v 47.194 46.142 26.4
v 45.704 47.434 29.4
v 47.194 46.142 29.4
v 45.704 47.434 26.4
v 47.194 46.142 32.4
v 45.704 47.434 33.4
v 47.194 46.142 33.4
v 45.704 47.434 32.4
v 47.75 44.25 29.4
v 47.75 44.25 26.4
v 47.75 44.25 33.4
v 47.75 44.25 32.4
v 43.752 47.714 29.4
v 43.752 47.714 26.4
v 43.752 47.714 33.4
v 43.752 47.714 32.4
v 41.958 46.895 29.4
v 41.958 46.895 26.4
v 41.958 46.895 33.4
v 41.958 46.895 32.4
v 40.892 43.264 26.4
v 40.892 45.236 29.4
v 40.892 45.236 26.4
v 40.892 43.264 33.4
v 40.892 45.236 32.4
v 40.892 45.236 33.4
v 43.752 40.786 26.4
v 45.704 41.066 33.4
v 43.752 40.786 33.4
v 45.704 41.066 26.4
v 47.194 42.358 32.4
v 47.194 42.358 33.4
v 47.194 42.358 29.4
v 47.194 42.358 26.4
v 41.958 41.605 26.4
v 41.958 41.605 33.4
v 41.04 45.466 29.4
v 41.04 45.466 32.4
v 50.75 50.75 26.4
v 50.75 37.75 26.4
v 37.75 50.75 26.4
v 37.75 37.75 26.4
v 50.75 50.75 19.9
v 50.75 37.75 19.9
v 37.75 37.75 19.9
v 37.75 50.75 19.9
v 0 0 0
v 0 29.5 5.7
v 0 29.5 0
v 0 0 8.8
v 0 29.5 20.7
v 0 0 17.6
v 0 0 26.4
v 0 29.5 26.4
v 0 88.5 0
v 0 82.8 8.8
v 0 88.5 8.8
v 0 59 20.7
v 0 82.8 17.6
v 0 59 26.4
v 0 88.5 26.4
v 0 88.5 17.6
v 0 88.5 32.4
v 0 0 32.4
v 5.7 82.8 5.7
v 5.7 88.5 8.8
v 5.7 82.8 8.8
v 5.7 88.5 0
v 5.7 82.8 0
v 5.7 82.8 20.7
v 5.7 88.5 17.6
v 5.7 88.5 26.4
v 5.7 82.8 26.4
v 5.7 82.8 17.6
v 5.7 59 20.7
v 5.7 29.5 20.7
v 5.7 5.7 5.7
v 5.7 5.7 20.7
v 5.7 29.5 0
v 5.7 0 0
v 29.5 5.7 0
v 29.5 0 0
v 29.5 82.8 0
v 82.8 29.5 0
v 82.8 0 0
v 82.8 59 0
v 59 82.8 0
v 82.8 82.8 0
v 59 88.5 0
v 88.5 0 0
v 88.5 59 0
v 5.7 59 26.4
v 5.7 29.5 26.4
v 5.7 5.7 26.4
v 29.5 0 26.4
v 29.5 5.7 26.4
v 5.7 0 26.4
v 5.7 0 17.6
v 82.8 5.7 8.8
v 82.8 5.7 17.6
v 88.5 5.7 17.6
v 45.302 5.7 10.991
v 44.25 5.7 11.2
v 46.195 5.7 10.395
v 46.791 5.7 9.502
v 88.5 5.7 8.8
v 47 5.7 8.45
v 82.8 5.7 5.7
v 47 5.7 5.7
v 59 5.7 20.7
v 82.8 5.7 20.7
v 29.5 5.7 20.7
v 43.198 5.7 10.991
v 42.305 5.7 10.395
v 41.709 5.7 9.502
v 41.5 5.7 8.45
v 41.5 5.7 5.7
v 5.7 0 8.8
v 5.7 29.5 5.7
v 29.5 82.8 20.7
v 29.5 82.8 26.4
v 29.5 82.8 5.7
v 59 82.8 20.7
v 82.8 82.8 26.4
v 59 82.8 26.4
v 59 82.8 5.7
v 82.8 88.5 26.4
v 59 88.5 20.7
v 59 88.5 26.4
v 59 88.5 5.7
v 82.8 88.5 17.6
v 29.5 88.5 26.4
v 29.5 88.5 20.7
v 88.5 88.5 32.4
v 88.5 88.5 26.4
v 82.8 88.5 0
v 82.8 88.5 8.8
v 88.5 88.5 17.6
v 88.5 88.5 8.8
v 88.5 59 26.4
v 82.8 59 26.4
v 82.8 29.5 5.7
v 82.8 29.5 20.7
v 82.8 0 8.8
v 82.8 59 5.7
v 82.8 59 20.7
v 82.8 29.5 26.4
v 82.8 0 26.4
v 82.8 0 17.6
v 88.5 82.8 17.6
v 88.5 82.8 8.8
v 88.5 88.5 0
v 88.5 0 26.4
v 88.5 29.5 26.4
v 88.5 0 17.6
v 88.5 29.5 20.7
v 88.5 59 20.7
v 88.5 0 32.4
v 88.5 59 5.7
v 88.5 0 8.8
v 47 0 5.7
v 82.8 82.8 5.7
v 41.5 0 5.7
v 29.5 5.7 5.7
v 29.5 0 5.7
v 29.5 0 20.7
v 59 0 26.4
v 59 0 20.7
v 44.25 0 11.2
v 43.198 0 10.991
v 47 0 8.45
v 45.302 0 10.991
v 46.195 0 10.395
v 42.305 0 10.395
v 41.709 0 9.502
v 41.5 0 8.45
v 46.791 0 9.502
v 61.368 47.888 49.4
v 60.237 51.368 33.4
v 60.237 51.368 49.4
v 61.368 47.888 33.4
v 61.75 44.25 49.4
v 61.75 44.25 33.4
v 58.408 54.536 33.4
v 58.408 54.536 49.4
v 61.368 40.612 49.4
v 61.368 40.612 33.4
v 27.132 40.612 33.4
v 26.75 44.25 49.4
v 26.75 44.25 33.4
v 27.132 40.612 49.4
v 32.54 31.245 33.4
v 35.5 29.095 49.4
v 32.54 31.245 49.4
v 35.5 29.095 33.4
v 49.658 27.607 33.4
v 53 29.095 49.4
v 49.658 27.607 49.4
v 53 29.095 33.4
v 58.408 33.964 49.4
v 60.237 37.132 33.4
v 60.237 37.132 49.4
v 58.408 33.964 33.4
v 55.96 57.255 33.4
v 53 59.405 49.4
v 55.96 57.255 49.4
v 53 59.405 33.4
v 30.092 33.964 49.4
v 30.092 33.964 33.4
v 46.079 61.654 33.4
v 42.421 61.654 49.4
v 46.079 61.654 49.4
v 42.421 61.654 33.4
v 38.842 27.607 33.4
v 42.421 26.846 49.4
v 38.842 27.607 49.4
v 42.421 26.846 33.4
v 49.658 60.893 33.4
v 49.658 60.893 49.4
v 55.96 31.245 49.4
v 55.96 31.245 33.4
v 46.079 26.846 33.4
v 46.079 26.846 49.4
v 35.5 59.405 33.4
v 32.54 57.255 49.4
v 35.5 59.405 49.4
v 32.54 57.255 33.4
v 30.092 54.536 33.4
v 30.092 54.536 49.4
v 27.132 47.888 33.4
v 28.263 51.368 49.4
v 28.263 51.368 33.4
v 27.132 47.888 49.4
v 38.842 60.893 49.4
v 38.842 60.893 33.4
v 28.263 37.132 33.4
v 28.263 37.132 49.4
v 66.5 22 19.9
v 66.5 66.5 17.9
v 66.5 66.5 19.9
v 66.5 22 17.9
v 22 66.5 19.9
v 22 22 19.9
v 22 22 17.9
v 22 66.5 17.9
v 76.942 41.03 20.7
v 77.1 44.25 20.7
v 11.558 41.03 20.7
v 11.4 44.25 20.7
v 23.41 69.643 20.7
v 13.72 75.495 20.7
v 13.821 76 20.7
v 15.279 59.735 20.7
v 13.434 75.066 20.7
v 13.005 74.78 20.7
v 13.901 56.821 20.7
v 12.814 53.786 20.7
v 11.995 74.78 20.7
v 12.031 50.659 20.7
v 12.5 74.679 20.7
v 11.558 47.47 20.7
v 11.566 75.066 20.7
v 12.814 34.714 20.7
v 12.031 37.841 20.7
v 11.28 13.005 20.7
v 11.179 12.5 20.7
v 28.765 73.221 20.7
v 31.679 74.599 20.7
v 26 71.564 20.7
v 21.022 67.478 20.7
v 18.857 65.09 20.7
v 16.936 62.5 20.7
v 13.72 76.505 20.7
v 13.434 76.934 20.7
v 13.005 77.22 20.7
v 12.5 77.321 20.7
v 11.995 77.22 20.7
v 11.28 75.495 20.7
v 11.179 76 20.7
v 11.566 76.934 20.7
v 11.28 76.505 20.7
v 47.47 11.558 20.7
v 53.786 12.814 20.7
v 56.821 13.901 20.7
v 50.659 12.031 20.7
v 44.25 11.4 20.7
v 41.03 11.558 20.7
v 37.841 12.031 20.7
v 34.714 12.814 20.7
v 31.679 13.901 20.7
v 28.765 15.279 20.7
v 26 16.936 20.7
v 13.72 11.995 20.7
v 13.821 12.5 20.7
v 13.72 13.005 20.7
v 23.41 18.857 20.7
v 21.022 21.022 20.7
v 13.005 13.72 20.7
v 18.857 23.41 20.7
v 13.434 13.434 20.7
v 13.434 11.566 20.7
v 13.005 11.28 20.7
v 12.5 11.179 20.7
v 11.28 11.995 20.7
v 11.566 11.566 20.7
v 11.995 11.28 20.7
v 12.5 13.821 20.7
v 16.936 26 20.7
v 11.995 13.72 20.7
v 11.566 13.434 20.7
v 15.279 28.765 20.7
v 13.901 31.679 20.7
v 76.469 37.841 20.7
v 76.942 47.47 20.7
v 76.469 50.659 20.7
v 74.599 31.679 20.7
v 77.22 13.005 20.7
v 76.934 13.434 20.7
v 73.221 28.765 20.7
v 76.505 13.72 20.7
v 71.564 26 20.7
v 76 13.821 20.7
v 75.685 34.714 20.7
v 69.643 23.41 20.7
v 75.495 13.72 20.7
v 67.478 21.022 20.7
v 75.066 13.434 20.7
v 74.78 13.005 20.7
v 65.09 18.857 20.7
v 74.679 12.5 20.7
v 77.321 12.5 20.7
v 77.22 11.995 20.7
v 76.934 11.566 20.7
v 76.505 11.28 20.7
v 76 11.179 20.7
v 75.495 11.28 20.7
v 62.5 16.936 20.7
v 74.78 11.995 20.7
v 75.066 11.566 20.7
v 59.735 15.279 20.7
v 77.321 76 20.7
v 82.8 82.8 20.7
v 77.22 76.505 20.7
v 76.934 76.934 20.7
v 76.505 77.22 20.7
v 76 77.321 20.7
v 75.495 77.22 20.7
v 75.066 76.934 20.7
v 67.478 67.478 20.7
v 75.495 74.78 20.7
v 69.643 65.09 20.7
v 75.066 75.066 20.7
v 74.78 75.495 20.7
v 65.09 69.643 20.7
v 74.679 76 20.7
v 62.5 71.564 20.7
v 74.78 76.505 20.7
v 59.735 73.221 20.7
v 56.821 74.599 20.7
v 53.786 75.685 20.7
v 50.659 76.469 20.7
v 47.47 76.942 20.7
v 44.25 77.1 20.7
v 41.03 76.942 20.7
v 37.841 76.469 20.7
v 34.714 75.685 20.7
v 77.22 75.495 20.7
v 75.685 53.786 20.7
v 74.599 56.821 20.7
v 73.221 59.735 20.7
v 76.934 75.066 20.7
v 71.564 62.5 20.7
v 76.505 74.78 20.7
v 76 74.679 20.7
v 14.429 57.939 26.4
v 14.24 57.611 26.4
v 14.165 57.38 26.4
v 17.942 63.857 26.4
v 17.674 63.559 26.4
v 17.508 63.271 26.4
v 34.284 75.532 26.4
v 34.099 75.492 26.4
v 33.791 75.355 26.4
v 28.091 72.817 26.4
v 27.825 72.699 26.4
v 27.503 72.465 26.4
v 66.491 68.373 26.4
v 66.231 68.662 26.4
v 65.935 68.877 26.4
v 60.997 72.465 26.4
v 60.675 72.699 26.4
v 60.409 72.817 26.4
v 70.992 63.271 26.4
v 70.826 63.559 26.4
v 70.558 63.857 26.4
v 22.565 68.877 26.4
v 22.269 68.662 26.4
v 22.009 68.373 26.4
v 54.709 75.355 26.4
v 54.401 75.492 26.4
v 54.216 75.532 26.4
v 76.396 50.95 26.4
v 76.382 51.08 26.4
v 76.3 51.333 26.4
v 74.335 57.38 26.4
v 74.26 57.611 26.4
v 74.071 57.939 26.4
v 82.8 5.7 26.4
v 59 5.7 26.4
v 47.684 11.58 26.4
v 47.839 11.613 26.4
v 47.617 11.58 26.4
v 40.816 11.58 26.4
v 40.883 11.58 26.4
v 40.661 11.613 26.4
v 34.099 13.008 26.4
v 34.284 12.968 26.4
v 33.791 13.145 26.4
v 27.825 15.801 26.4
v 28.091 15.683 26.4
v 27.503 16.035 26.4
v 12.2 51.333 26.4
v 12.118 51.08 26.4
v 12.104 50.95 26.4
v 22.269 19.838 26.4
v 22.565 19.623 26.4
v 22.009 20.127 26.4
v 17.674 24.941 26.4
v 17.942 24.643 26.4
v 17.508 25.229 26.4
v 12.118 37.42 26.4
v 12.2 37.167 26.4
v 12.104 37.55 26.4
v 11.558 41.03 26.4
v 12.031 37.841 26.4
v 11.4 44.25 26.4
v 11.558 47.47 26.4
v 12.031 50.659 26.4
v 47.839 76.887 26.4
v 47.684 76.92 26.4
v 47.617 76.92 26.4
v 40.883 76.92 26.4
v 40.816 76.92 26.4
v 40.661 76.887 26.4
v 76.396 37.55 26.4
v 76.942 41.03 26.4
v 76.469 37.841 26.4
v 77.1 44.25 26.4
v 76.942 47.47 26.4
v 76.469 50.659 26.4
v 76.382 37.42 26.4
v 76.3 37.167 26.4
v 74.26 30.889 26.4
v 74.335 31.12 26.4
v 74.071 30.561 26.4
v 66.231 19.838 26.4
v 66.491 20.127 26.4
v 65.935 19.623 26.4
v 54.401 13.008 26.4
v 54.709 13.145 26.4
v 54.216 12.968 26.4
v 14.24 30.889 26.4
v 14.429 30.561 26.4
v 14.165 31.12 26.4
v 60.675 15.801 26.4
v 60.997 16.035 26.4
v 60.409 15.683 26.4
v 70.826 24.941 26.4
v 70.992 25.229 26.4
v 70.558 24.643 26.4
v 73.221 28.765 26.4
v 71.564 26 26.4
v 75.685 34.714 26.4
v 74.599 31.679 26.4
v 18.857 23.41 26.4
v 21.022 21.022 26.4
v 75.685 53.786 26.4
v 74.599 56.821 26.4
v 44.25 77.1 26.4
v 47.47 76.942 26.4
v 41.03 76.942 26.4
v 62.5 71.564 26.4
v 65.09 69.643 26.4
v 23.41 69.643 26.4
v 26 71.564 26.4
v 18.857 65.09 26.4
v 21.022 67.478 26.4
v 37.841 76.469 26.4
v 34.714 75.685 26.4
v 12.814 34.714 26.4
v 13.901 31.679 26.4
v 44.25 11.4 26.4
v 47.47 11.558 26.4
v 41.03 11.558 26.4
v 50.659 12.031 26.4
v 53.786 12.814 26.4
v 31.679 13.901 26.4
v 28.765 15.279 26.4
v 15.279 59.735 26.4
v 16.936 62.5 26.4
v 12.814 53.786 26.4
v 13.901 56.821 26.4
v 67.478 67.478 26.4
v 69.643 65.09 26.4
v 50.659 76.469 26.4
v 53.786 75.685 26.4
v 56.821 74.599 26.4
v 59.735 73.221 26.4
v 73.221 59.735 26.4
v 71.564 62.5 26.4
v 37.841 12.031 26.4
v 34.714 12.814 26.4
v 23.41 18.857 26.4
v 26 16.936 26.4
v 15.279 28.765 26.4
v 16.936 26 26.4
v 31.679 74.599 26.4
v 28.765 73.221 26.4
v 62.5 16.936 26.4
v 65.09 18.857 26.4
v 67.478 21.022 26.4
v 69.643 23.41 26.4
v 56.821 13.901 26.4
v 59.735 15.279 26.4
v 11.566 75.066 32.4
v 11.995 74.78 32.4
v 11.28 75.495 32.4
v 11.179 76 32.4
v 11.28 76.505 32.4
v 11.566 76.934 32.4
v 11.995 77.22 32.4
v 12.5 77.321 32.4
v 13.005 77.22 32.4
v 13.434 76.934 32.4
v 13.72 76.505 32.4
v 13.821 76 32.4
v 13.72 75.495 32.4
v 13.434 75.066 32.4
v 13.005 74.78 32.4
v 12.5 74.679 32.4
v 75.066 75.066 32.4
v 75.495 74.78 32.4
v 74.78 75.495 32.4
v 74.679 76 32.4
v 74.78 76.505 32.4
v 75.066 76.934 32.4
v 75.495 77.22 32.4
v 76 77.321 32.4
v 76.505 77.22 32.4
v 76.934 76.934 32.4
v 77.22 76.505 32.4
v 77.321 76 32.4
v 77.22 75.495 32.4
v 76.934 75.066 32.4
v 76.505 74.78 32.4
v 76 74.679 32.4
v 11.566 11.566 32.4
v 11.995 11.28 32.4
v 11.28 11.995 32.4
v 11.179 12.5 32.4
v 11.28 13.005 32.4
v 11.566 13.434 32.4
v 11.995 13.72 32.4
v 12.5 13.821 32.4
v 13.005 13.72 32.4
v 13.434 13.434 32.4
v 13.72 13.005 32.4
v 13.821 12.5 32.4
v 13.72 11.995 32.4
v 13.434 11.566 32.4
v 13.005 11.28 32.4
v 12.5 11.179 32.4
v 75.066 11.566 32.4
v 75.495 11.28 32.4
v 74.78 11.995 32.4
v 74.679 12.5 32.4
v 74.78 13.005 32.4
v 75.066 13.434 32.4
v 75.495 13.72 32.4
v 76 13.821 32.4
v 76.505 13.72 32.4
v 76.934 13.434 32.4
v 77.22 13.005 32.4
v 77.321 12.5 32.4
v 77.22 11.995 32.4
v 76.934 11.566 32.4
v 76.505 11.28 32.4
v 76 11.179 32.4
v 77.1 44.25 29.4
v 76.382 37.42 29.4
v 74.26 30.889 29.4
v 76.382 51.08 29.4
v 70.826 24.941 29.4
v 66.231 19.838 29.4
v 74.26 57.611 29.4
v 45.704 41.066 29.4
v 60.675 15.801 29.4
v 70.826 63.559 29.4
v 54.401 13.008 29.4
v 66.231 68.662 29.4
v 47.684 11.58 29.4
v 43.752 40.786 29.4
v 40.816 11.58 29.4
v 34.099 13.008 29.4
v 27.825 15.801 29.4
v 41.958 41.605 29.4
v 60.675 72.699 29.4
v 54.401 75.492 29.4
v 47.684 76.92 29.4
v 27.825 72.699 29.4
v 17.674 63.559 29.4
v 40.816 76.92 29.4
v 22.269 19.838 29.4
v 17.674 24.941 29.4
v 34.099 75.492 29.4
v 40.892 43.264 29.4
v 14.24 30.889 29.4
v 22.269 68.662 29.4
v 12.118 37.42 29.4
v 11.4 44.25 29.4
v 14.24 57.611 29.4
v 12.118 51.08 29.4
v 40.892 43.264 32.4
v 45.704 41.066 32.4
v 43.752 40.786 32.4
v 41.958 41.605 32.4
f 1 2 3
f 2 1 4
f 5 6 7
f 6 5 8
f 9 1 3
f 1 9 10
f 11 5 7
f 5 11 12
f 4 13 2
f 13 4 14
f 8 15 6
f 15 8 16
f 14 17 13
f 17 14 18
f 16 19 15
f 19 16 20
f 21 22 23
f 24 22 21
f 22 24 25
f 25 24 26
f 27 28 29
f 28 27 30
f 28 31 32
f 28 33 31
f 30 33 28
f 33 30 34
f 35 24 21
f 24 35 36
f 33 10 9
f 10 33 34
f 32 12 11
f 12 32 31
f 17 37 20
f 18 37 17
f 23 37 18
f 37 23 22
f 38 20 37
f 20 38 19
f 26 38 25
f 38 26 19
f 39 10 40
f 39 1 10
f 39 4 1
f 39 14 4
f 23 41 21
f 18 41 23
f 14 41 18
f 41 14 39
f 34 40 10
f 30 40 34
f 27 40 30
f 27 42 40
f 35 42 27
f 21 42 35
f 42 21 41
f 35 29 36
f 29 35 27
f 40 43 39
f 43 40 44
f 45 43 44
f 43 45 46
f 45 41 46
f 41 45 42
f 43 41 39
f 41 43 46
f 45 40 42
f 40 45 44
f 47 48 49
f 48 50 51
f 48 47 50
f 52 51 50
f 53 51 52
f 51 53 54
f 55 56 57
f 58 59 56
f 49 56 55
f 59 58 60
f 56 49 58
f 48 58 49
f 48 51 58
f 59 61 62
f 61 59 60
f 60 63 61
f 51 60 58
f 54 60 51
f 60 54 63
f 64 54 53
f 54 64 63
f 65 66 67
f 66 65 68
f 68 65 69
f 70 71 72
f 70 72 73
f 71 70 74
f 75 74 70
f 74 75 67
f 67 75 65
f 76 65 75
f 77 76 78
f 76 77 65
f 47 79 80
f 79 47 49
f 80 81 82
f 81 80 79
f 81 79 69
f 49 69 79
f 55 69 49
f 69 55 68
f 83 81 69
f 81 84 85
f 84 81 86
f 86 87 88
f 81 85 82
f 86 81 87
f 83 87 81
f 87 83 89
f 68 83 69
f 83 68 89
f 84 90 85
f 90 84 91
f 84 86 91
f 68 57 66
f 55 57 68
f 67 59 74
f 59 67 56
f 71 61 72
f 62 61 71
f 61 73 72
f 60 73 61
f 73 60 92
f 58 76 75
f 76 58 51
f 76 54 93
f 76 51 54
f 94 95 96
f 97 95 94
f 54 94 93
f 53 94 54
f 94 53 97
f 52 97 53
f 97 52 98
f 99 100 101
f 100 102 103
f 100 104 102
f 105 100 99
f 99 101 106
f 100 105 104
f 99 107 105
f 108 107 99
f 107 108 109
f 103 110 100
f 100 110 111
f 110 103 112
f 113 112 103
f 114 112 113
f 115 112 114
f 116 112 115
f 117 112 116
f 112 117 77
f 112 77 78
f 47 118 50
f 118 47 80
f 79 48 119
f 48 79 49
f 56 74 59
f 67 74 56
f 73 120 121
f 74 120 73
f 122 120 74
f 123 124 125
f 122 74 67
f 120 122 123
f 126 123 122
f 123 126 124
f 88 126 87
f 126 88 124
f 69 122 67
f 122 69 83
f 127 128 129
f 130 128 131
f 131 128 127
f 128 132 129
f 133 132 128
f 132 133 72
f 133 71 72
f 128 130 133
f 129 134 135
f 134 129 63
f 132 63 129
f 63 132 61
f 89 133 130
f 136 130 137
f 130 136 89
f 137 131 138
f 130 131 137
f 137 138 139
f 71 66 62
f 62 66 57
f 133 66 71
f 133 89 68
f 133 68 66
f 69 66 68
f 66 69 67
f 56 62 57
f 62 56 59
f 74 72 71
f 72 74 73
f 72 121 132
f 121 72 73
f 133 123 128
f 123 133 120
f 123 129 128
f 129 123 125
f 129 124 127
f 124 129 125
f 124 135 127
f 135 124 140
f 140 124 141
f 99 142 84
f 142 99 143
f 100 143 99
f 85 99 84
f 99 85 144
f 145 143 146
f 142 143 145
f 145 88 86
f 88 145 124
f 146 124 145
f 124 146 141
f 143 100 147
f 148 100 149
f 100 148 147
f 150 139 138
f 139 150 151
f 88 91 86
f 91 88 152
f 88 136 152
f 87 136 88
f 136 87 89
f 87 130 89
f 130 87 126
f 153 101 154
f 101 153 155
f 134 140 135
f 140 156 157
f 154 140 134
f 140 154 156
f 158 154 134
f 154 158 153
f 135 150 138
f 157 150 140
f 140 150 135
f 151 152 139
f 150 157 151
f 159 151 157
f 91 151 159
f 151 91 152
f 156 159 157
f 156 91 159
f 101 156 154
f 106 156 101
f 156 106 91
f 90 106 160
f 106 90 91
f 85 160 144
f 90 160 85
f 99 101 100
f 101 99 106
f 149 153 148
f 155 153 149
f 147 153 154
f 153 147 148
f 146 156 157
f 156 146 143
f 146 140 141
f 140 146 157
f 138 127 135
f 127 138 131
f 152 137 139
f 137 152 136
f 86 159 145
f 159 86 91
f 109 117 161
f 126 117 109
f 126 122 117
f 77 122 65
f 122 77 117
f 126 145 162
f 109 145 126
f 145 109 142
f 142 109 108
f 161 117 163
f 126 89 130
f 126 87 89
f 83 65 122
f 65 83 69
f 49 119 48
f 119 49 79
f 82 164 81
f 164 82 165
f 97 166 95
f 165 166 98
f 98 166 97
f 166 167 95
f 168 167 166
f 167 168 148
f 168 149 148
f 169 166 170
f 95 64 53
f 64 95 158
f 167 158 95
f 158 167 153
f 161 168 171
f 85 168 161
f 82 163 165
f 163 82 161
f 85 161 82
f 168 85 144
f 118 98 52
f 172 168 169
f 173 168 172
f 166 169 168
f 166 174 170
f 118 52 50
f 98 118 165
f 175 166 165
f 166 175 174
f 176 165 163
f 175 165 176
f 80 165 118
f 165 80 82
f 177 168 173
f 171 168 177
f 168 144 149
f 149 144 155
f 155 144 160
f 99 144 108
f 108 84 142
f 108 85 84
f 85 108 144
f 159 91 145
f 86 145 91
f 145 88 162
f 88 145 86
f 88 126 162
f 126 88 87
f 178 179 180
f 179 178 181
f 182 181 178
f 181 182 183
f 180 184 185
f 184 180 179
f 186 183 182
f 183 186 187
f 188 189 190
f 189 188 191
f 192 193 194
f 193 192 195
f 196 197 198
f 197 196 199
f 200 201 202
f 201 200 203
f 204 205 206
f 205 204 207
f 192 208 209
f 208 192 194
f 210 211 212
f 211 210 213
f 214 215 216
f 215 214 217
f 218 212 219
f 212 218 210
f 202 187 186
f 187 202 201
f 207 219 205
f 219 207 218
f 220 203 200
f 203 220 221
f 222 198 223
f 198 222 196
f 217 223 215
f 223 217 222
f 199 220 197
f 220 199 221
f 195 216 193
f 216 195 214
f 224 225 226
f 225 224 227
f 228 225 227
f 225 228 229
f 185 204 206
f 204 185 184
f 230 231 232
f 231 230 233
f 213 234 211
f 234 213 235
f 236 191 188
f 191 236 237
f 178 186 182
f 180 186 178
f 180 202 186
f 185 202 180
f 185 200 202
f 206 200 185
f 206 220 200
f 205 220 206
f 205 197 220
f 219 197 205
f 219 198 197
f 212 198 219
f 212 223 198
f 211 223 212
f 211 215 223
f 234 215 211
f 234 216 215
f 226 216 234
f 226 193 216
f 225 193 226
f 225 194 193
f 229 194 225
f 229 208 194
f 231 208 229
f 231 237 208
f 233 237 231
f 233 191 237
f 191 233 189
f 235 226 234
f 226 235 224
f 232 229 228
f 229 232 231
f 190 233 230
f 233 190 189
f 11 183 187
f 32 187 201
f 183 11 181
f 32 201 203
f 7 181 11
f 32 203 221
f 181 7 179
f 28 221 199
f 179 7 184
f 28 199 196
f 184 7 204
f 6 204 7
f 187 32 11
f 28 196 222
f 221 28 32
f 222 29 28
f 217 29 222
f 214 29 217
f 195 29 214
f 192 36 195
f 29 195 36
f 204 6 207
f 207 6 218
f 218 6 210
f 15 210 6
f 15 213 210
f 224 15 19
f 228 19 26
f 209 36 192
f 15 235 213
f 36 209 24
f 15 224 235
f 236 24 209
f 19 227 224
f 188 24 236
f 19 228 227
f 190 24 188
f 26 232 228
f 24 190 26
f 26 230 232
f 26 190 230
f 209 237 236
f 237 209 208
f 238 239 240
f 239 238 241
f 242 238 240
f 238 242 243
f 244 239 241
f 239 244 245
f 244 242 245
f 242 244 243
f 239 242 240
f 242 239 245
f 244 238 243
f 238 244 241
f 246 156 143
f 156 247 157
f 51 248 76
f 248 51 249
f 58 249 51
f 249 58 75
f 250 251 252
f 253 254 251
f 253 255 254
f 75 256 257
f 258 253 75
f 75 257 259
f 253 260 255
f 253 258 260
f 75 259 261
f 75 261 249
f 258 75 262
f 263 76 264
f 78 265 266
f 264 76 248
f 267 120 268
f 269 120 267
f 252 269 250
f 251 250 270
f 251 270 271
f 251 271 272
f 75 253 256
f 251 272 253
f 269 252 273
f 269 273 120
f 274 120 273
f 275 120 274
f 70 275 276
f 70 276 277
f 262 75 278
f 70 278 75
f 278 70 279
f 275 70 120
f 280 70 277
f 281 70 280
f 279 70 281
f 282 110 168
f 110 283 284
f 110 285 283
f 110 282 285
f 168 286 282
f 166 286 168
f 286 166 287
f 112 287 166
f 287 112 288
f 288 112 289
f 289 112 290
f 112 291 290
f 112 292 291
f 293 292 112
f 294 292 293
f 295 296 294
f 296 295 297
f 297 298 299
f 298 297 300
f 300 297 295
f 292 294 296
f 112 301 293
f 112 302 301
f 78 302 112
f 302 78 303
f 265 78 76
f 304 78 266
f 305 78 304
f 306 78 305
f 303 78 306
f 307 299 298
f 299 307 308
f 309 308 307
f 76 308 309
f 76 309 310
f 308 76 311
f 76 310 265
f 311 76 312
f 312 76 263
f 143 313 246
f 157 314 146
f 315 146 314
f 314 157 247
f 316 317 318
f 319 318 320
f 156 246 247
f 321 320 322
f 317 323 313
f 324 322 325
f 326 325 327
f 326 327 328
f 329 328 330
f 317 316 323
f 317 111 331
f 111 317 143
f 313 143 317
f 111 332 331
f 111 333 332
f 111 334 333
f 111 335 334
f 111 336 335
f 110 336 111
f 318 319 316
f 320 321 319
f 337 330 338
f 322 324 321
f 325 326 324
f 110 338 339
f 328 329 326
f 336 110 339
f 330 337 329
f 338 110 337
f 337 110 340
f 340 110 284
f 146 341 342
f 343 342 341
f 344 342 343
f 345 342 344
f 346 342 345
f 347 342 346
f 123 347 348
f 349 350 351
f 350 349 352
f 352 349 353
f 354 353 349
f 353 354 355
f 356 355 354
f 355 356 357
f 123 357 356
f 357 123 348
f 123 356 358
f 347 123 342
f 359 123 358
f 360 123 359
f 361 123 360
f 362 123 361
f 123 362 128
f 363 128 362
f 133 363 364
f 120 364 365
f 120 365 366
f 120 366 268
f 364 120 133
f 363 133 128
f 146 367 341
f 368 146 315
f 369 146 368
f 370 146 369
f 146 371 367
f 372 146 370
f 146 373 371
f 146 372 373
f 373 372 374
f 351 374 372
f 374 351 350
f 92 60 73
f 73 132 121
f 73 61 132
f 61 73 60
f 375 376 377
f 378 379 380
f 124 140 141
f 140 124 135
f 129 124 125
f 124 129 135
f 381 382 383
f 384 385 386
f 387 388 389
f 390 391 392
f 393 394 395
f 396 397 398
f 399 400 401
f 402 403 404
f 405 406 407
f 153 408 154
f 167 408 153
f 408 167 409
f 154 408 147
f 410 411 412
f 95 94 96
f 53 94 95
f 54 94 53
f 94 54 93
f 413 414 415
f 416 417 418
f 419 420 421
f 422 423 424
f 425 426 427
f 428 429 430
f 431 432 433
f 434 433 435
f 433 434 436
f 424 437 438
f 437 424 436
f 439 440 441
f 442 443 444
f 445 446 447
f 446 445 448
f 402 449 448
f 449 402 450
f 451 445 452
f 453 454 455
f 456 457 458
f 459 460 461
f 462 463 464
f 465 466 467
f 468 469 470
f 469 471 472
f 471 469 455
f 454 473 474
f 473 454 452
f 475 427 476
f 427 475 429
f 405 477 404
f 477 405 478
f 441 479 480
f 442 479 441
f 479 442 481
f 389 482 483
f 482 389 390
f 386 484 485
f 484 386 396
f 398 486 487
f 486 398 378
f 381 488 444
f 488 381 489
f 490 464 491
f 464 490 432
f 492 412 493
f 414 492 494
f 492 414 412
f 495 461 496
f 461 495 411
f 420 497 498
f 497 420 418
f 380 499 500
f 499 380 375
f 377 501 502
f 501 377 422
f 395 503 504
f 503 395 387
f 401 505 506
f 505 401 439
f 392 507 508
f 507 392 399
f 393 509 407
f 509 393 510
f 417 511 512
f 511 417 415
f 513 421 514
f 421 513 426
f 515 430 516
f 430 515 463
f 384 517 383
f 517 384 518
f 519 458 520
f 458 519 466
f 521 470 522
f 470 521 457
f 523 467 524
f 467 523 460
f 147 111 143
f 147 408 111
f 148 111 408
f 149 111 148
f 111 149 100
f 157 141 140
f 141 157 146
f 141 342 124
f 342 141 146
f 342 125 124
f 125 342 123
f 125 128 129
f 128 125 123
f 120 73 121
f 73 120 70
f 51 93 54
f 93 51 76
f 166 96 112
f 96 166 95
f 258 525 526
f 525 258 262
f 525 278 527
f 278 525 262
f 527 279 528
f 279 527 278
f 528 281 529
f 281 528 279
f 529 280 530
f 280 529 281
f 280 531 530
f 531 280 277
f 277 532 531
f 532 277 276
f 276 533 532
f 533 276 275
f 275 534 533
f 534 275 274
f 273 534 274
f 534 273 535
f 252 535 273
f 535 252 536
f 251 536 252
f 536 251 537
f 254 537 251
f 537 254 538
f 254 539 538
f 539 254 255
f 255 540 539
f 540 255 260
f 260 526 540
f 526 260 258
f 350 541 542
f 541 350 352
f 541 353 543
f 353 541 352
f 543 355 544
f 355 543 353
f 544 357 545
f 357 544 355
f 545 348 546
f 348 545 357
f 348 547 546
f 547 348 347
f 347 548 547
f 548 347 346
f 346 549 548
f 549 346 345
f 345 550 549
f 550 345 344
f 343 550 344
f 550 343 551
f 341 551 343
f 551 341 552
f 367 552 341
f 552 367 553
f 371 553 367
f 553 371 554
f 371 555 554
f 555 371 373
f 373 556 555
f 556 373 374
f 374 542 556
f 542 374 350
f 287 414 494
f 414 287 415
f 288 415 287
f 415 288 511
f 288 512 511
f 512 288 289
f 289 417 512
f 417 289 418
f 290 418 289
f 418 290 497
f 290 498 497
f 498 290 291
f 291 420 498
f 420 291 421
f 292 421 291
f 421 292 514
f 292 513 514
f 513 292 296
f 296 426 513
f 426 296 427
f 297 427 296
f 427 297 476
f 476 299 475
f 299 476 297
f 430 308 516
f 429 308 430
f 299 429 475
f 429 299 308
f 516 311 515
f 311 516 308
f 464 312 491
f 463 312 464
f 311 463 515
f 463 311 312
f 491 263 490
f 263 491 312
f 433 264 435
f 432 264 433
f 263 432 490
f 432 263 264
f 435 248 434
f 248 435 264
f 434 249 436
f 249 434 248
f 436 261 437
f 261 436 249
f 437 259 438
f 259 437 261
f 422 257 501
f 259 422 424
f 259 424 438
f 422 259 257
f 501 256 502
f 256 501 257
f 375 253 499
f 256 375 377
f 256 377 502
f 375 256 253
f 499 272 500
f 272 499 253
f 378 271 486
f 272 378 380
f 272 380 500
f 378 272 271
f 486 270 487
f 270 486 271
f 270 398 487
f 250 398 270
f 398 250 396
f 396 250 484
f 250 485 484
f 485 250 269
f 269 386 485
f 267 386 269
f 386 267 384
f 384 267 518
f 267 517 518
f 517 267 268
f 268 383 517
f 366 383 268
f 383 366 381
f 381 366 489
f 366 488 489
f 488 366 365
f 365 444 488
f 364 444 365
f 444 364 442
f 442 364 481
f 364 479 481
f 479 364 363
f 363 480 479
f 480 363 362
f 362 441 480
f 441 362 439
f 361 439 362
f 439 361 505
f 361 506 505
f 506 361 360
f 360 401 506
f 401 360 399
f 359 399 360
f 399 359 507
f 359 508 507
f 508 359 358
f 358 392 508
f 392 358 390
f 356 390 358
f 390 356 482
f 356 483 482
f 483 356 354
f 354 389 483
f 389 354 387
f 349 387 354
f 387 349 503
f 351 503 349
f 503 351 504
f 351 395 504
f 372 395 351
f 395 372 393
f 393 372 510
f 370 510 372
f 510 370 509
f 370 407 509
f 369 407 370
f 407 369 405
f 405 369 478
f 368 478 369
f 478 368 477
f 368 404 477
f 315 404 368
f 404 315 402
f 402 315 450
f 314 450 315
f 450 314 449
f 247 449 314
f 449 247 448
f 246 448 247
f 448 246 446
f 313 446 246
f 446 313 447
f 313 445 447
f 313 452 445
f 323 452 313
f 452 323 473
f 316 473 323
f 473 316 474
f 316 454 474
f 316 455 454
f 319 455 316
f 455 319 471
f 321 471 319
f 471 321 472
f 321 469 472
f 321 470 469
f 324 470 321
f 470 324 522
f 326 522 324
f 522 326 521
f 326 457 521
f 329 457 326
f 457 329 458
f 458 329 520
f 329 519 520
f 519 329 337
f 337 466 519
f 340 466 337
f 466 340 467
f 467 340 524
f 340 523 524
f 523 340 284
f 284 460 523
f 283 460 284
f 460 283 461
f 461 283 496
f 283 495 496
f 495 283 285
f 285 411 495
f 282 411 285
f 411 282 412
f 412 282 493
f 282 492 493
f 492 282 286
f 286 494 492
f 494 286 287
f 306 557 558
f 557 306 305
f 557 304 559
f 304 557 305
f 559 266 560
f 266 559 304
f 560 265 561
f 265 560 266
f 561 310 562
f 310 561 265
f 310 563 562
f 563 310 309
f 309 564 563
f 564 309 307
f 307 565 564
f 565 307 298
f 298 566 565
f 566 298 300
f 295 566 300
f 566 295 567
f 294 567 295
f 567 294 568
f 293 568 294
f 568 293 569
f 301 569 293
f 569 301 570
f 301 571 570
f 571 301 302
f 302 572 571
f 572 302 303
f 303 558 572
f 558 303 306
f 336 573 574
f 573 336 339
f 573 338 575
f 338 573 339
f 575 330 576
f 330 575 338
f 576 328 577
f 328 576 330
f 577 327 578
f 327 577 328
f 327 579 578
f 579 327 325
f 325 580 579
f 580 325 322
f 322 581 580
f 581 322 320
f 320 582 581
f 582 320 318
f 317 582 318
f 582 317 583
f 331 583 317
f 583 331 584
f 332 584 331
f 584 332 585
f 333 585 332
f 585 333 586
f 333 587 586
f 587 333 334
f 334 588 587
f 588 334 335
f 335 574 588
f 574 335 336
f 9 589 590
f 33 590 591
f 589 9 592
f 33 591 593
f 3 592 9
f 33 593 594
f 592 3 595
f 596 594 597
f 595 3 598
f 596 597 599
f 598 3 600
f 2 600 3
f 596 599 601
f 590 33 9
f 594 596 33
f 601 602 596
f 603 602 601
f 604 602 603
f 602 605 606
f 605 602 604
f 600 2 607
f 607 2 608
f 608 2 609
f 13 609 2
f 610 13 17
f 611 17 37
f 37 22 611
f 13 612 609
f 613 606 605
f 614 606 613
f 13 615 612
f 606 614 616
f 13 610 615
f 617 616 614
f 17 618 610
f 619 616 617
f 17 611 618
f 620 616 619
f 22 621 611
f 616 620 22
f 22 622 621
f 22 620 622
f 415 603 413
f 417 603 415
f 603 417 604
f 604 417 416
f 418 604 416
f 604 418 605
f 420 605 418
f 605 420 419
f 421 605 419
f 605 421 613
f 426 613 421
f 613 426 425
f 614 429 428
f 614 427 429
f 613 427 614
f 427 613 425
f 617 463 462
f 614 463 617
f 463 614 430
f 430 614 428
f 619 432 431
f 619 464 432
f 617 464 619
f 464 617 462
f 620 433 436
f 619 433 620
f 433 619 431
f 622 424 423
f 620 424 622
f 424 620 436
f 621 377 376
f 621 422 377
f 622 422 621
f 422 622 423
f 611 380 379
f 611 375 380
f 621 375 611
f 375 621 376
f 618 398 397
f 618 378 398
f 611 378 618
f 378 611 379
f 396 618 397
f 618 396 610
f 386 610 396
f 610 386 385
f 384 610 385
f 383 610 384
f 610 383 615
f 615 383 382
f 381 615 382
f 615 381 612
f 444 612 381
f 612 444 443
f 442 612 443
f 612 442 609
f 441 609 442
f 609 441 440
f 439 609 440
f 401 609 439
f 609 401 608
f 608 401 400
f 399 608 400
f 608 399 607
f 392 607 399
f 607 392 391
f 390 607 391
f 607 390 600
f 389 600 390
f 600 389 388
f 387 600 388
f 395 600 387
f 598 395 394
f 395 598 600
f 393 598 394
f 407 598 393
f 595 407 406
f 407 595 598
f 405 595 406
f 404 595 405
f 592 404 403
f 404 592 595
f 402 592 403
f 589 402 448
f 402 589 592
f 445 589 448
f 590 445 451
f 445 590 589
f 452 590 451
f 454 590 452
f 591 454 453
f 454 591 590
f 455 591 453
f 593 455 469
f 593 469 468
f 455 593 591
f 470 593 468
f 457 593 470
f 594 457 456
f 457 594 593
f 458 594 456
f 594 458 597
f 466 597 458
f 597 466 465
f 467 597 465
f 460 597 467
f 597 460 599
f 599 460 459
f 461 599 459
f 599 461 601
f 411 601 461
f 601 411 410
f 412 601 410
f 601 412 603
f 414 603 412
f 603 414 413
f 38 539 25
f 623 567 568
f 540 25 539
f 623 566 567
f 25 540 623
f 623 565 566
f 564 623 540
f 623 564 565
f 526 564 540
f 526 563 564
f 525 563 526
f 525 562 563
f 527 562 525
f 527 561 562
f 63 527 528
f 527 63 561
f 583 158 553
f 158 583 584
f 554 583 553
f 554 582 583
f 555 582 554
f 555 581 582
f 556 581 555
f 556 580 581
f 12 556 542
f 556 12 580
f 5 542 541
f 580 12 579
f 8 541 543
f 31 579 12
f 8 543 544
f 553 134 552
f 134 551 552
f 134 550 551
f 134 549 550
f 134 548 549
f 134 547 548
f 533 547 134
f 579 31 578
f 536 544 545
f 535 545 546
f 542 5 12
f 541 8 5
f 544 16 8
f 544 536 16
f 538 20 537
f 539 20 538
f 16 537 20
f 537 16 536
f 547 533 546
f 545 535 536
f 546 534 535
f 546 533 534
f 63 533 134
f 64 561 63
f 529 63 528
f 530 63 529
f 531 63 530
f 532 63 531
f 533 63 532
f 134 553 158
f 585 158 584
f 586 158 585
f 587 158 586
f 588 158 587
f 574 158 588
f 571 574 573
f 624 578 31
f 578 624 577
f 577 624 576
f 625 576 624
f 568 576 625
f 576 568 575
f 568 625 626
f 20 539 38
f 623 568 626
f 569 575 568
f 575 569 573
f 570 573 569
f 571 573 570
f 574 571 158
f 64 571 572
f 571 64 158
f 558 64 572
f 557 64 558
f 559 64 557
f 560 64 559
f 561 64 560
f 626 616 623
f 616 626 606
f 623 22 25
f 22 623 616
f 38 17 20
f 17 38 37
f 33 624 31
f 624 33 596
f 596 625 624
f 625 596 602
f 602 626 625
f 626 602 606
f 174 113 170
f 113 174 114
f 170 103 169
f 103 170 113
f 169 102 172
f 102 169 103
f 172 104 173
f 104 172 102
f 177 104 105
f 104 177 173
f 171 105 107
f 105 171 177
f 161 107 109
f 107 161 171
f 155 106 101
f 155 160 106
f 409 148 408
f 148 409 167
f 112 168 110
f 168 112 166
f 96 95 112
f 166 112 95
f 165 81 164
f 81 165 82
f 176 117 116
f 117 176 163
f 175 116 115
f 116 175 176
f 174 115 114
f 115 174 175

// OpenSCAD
kerf = 0.1;

TW = 5.7; // wood
//TW = 3.5; // thinner wood
TA = 3.0; // acrylic

// 3h + w = 181
// 3w = 181

tn = 3;
tnb = 3;
tnt = 3;

s440 = 2.845/2;

inset = TW; // inset of acrylic in wood

middle = 100;

box_s = 5*TW*4;
P = 2; 
box_s = 59*3/2; // floor((181-2*2)/3);
box_h = TW*4;
box_h = 16;
box_h = 15 + 2*TW;

inch = 25.4;
screw_space = inch * (1-2*0.15);

//function brown(i, a=1) = [0.7-i/10, 0.4-i/10, 0, a];
function brown(i, a=1) = [0.5-i/20, 0.3-i/20, 0, a];

module tabs(n, l, o=0, v=0, tt=TW) {
    ts = l/n;
    for (i=[0:n-1]) {
        x = v ? ts*i : 0;
        y = v ? 0 : ts*i;
        w = v ? ts : tt;
        h = v ? tt : ts;
        if ((i+o)%2) {
            translate([x, y])
            square([w, h]);
        }
    }
}

module side(o) {
    translate([TW, 0])
    difference() {
        union() {
            // Base
            square([box_s-2*TW, box_h]);
            // Sides
            translate([box_s-2*TW, 0])
            tabs(tn, box_h, o=o);
            translate([-TW, 0])
            tabs(tn, box_h, o=o);
        }
        // Bottom
        translate([-TW, 0])
        tabs(tnb, box_s-0*TW, v=1);
        // Top
        translate([-TW, box_h-TW])
        tabs(tn, box_s-0*TW, v=1);
        *if (o) {
            translate([-TW, box_h-TW])
            square([box_s/3, TW]);
            translate([box_s*2/3-TW, box_h-TW])
            square([box_s/3, TW]);
        }
    }
}

module front(tn=tn) {
    union() {
        translate([TW, TW])
        square([box_s-2*TW, box_s-2*TW]);

        tabs(tn, box_s);
        translate([box_s-TW, 0])
        tabs(tn, box_s);

        tabs(tn, box_s, v=1);
        translate([0, box_s-TW])
        tabs(tn, box_s, v=1);
    }
}

screw_space = box_s-25;
screw_offset = (box_s-screw_space)/2;

module screw_holes() {
    // Screws
    $fn = pow(2, 4);
    offset(-kerf) {
        translate([screw_offset, screw_offset]) circle(r=s440);
        translate([screw_offset+screw_space, screw_offset]) circle(r=s440);
        translate([screw_offset, screw_offset+screw_space]) circle(r=s440);
        translate([screw_offset+screw_space, screw_offset+screw_space]) circle(r=s440);
    }
}

module screw() {
    circle(r=s440*2);

    translate([0, 0, -6])
    linear_extrude(height=6)
    circle(r=s440);
}

module screws() {
    // Screws
    $fn = pow(2, 4);
    translate([screw_offset, screw_offset]) screw();
    translate([screw_offset+screw_space, screw_offset]) screw();
    translate([screw_offset, screw_offset+screw_space]) screw();
    translate([screw_offset+screw_space, screw_offset+screw_space]) screw();
}

module knob() {
    cylinder(16, r=35/2);
    //cylinder(20, r=44/2);
}

module encoder() {
    cylinder(7, r=7/2);
    cylinder(20, r=6/2);
    translate([-13/2, -13/2, -6.5])
    cube([13, 13, 6.5]);
}

module board() {
    board_s = 44.5;
    translate([-board_s/2, -board_s/2, -6.5-2])
    cube([board_s, board_s, 2]);
}

module toppiece() {
    difference() {
        bottom();
        $fn=64;
        translate([box_s/2, box_s/2])
        circle(r=(box_s-4*TW)/2);
        screw_holes();
    }
}

module top() {
    difference() {
        square([box_s, box_s]);
        screw_holes();
        translate([box_s/2, box_s/2]) circle(r=7/2);
    }
}

module cleartop() {
    difference() {
        square([box_s, box_s]);
        screw_holes();
        translate([box_s/2, box_s/2]) circle(r=7/2);
        translate([box_s/2, box_s/2])
        circle(r=(box_s-4*TW)/2);
    }
}

module back() {
    difference() {
        side(0);
        $fn = 16;
        ww = 5.5;
        translate([box_s/2, TW+ww/2])
        circle(r=ww/2); // 5.5, 4.5, 3 dia
        translate([box_s/2-ww/2, TW-ww/2])
        square(ww);
    }
}

module bottom() {
    translate([TW, TW])
    square(box_s-TW*2);

    // Tabs
    translate([box_s/2, box_s/2])
    for (i=[0:3]) {
        rotate([0, 0, 90*i])
        translate([box_s/2-TW, -box_s/2, 0])
        tabs(tnb, box_s, o=(i+1)%2*((tnb+1)%2));
    }
}
module show3d() {

    // Bottom
    color(brown(0))
    translate([0, 0, 0])
    linear_extrude(height=TW)
    bottom();

    // Innards

    color([0.7,0.7,0.7])
    translate([0, 0, box_h+2*TA])
    screws();

    color([0.7,0.7,0.7])
    translate([box_s/2, box_s/2, box_h+TA+TA+1])
    knob();

    color([0.7,0.7,0.7])
    translate([box_s/2, box_s/2, box_h+TA-TA])
    encoder();
    
    color([0.3,0.2,1.0])
    translate([box_s/2, box_s/2, box_h+TA-TA])
    board();

    // Top

    color(brown(3))
    translate([0, 0, box_h-TW])
    //translate([0, 0, TW])
    linear_extrude(height=TW)
    toppiece();

    color([0.0,0.5,1.0,0.5])
    translate([0, 0, box_h])
    linear_extrude(height=TA)
    cleartop();

    color([0,0,0])
    translate([0, 0, box_h+TA])
    linear_extrude(height=TA)
    top();

    // Sides

    for (i=[1:3]) {
        o1 = floor(i/2) * box_s;
        o2 = ((i+1)%2) * -TW;
        translate([o1, o1, 0])
        rotate([90, 0, 90*i])
        translate([0, 0, o2])
        color(brown((i-1)))
        linear_extrude(height=TW)
        side(i%2);
    }

    rotate([90, 0, 0])
    translate([0, 0, -TW])
    color(brown((4)))
    linear_extrude(height=TW)
    back();
}

module show2d() {
    translate([0*(box_s+P), -1])
    bottom();

    translate([1*(box_s+P), -1])
    toppiece();

    translate([1*(box_s+P), 1*(box_s)])
    back();

    translate([0*(box_s+P), 1*(box_s)])
    side(1);

    translate([1*(box_s+P), 1*(box_s)+1*(box_h+P)])
    side(0);

    translate([0*(box_s+P), 1*(box_s)+1*(box_h+P)])
    side(1);
}

show3d();
//linear_extrude(height=TW)
offset(kerf)
//cleartop();
show2d();
translate([0,0,-1])
color([0.3,0.3,0.3])
*square([181,181]);
//linear_extrude(height=TA)
//front(tnt);
